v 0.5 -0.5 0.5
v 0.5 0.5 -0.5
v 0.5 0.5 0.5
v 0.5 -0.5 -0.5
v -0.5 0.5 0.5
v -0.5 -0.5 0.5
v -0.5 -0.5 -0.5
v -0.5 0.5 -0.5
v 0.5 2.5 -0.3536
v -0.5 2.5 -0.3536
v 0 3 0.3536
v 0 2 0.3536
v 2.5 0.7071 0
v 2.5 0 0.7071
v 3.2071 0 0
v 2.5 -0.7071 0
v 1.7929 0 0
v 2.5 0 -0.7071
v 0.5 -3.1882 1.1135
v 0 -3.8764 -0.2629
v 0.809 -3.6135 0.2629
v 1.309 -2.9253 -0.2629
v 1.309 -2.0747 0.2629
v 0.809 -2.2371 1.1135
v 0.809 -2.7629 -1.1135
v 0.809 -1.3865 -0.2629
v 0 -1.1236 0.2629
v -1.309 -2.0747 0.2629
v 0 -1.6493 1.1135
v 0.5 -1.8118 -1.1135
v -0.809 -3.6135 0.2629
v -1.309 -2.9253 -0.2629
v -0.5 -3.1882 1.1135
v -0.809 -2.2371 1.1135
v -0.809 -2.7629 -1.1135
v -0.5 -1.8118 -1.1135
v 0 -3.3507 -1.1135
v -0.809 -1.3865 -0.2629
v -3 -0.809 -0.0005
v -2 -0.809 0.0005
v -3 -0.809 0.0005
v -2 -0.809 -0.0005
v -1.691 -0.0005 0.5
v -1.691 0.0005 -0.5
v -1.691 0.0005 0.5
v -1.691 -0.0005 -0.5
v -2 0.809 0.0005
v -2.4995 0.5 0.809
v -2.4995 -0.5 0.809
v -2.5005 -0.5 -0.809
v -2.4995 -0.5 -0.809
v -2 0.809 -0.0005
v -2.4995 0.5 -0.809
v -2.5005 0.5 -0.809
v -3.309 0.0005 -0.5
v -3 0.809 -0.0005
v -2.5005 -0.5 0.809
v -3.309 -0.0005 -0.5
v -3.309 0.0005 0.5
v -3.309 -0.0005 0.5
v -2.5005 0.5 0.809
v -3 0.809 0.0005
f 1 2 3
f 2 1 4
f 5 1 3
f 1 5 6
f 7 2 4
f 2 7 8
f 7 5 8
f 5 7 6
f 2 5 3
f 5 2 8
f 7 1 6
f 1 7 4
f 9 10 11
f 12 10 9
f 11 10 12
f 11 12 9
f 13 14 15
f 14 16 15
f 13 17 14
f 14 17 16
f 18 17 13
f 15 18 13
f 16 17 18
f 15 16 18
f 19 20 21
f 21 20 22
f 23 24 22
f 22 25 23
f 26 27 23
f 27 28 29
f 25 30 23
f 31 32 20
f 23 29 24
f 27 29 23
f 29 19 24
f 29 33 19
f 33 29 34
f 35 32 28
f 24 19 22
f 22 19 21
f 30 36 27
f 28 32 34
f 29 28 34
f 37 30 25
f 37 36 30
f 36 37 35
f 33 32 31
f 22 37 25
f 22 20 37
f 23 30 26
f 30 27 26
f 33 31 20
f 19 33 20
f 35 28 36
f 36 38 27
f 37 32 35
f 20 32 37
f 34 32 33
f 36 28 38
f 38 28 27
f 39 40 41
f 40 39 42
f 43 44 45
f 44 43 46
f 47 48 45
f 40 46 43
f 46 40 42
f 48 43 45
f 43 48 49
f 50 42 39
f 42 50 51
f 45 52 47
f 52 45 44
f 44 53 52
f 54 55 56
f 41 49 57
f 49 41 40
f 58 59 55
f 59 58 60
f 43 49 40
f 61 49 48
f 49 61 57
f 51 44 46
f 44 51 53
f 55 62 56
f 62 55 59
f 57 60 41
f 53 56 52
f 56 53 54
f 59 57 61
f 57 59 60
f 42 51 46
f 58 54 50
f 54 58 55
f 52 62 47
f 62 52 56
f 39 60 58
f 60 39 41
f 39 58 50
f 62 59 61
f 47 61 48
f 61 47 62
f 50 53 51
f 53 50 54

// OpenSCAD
/* ##  #   # # ###  ## ### ### ### ###    ## ### ### ###
 * # # #   # # #   #    #  # # # # #     #   # # #    #
 * ##  #   # # ##   #   #  # # # # ##     #  # # ##   #
 * # # #   # # #     #  #  # # # # #       # # # #    #
 * ##  ### ### ### ##   #  ### # # ###   ##  ### #    #
 *
 * Graphical toolkit module - platonic_solids - version 1.0
 *
 * OpenSCAD has cubes, but this module adds support for the other
 * 3-dimensional platonic solids
 * (Tetrahedron, Octahedron, Dodecahedron, Icosahedron)
 *
 * Usages:
 *     tetrahedron(s)  - Draws a tetrahedron, default size 1mm
 *     octahedron(s)   - Draws an octahedron, default size 1mm
 *     dodecahedron(s) - Draws a dodecahedron, default size 1mm
 *     icosahedron(s)  - Draws an icosahedron, default size 1mm
 * Note: size refers to the desired side length.
 * Note: Due to the way the icosahedron is constructed, you have an
 *   optional variable "t" short for "TINY" - Set this to be very low
 *   if, for some reason, the model requires NO flattened edges. By
 *   default, it's set to 0.001, so this shouldn't be necessary.
 *
 * The dodecahedron code came from Thingiverse, thing #204547 -
 * "Simple openscad dodecahedron" by RevK
 *
 * Put the bug-fix history here.
 */

// Put the test model here. Don't worry, it'll only be visible when
// the module is called using include.
cube(center = true);
translate([0, 2.5, 0]) tetrahedron();
translate([2.5, 0, 0]) octahedron();
translate([0, -2.5, 0]) dodecahedron();
translate([-2.5, 0, 0]) icosahedron();

module tetrahedron(s = 1) {
    s = s / 2;
    f = s * sqrt(2) / 2;
    polyhedron(
        points = [ [s, 0, -f], [-s, 0, -f], [0, s, f], [0, -s, f] ],
        faces  = [ [2, 1, 0], [0, 1, 3], [1, 2, 3], [2, 0, 3] ]
    );
}

module octahedron(s = 1) {
    s = s / sqrt(2);
    polyhedron(
        points = [ [s, 0, 0], [-s, 0, 0], [0, s, 0], [0, -s, 0],
            [0, 0, s], [0, 0, -s] ],
        faces = [ [4, 2, 0], [0, 2, 5], [0, 3, 4], [5, 3, 0],
            [1, 2, 4], [5, 2, 1], [4, 3, 1], [1, 3, 5] ]
    );
}

module dodecahedron(s = 1) {
    s = s * (1 + sqrt(5)) / 2;
    f = atan(sqrt(5) / 2 - 0.5);
    hull()
        for(a=[0 : 72 : 288])
            rotate([f, 0, a])
                translate([-s / 2, -s / 2, -s / 2])
                    cube(s);
}

module icosahedron(s = 1, t = 0.001) {
    p = s * (1 + sqrt(5)) / 2;
    hull() {
        cube([s, p, t], center = true);
        cube([t, s, p], center = true);
        cube([p, t, s], center = true);
    }
}
